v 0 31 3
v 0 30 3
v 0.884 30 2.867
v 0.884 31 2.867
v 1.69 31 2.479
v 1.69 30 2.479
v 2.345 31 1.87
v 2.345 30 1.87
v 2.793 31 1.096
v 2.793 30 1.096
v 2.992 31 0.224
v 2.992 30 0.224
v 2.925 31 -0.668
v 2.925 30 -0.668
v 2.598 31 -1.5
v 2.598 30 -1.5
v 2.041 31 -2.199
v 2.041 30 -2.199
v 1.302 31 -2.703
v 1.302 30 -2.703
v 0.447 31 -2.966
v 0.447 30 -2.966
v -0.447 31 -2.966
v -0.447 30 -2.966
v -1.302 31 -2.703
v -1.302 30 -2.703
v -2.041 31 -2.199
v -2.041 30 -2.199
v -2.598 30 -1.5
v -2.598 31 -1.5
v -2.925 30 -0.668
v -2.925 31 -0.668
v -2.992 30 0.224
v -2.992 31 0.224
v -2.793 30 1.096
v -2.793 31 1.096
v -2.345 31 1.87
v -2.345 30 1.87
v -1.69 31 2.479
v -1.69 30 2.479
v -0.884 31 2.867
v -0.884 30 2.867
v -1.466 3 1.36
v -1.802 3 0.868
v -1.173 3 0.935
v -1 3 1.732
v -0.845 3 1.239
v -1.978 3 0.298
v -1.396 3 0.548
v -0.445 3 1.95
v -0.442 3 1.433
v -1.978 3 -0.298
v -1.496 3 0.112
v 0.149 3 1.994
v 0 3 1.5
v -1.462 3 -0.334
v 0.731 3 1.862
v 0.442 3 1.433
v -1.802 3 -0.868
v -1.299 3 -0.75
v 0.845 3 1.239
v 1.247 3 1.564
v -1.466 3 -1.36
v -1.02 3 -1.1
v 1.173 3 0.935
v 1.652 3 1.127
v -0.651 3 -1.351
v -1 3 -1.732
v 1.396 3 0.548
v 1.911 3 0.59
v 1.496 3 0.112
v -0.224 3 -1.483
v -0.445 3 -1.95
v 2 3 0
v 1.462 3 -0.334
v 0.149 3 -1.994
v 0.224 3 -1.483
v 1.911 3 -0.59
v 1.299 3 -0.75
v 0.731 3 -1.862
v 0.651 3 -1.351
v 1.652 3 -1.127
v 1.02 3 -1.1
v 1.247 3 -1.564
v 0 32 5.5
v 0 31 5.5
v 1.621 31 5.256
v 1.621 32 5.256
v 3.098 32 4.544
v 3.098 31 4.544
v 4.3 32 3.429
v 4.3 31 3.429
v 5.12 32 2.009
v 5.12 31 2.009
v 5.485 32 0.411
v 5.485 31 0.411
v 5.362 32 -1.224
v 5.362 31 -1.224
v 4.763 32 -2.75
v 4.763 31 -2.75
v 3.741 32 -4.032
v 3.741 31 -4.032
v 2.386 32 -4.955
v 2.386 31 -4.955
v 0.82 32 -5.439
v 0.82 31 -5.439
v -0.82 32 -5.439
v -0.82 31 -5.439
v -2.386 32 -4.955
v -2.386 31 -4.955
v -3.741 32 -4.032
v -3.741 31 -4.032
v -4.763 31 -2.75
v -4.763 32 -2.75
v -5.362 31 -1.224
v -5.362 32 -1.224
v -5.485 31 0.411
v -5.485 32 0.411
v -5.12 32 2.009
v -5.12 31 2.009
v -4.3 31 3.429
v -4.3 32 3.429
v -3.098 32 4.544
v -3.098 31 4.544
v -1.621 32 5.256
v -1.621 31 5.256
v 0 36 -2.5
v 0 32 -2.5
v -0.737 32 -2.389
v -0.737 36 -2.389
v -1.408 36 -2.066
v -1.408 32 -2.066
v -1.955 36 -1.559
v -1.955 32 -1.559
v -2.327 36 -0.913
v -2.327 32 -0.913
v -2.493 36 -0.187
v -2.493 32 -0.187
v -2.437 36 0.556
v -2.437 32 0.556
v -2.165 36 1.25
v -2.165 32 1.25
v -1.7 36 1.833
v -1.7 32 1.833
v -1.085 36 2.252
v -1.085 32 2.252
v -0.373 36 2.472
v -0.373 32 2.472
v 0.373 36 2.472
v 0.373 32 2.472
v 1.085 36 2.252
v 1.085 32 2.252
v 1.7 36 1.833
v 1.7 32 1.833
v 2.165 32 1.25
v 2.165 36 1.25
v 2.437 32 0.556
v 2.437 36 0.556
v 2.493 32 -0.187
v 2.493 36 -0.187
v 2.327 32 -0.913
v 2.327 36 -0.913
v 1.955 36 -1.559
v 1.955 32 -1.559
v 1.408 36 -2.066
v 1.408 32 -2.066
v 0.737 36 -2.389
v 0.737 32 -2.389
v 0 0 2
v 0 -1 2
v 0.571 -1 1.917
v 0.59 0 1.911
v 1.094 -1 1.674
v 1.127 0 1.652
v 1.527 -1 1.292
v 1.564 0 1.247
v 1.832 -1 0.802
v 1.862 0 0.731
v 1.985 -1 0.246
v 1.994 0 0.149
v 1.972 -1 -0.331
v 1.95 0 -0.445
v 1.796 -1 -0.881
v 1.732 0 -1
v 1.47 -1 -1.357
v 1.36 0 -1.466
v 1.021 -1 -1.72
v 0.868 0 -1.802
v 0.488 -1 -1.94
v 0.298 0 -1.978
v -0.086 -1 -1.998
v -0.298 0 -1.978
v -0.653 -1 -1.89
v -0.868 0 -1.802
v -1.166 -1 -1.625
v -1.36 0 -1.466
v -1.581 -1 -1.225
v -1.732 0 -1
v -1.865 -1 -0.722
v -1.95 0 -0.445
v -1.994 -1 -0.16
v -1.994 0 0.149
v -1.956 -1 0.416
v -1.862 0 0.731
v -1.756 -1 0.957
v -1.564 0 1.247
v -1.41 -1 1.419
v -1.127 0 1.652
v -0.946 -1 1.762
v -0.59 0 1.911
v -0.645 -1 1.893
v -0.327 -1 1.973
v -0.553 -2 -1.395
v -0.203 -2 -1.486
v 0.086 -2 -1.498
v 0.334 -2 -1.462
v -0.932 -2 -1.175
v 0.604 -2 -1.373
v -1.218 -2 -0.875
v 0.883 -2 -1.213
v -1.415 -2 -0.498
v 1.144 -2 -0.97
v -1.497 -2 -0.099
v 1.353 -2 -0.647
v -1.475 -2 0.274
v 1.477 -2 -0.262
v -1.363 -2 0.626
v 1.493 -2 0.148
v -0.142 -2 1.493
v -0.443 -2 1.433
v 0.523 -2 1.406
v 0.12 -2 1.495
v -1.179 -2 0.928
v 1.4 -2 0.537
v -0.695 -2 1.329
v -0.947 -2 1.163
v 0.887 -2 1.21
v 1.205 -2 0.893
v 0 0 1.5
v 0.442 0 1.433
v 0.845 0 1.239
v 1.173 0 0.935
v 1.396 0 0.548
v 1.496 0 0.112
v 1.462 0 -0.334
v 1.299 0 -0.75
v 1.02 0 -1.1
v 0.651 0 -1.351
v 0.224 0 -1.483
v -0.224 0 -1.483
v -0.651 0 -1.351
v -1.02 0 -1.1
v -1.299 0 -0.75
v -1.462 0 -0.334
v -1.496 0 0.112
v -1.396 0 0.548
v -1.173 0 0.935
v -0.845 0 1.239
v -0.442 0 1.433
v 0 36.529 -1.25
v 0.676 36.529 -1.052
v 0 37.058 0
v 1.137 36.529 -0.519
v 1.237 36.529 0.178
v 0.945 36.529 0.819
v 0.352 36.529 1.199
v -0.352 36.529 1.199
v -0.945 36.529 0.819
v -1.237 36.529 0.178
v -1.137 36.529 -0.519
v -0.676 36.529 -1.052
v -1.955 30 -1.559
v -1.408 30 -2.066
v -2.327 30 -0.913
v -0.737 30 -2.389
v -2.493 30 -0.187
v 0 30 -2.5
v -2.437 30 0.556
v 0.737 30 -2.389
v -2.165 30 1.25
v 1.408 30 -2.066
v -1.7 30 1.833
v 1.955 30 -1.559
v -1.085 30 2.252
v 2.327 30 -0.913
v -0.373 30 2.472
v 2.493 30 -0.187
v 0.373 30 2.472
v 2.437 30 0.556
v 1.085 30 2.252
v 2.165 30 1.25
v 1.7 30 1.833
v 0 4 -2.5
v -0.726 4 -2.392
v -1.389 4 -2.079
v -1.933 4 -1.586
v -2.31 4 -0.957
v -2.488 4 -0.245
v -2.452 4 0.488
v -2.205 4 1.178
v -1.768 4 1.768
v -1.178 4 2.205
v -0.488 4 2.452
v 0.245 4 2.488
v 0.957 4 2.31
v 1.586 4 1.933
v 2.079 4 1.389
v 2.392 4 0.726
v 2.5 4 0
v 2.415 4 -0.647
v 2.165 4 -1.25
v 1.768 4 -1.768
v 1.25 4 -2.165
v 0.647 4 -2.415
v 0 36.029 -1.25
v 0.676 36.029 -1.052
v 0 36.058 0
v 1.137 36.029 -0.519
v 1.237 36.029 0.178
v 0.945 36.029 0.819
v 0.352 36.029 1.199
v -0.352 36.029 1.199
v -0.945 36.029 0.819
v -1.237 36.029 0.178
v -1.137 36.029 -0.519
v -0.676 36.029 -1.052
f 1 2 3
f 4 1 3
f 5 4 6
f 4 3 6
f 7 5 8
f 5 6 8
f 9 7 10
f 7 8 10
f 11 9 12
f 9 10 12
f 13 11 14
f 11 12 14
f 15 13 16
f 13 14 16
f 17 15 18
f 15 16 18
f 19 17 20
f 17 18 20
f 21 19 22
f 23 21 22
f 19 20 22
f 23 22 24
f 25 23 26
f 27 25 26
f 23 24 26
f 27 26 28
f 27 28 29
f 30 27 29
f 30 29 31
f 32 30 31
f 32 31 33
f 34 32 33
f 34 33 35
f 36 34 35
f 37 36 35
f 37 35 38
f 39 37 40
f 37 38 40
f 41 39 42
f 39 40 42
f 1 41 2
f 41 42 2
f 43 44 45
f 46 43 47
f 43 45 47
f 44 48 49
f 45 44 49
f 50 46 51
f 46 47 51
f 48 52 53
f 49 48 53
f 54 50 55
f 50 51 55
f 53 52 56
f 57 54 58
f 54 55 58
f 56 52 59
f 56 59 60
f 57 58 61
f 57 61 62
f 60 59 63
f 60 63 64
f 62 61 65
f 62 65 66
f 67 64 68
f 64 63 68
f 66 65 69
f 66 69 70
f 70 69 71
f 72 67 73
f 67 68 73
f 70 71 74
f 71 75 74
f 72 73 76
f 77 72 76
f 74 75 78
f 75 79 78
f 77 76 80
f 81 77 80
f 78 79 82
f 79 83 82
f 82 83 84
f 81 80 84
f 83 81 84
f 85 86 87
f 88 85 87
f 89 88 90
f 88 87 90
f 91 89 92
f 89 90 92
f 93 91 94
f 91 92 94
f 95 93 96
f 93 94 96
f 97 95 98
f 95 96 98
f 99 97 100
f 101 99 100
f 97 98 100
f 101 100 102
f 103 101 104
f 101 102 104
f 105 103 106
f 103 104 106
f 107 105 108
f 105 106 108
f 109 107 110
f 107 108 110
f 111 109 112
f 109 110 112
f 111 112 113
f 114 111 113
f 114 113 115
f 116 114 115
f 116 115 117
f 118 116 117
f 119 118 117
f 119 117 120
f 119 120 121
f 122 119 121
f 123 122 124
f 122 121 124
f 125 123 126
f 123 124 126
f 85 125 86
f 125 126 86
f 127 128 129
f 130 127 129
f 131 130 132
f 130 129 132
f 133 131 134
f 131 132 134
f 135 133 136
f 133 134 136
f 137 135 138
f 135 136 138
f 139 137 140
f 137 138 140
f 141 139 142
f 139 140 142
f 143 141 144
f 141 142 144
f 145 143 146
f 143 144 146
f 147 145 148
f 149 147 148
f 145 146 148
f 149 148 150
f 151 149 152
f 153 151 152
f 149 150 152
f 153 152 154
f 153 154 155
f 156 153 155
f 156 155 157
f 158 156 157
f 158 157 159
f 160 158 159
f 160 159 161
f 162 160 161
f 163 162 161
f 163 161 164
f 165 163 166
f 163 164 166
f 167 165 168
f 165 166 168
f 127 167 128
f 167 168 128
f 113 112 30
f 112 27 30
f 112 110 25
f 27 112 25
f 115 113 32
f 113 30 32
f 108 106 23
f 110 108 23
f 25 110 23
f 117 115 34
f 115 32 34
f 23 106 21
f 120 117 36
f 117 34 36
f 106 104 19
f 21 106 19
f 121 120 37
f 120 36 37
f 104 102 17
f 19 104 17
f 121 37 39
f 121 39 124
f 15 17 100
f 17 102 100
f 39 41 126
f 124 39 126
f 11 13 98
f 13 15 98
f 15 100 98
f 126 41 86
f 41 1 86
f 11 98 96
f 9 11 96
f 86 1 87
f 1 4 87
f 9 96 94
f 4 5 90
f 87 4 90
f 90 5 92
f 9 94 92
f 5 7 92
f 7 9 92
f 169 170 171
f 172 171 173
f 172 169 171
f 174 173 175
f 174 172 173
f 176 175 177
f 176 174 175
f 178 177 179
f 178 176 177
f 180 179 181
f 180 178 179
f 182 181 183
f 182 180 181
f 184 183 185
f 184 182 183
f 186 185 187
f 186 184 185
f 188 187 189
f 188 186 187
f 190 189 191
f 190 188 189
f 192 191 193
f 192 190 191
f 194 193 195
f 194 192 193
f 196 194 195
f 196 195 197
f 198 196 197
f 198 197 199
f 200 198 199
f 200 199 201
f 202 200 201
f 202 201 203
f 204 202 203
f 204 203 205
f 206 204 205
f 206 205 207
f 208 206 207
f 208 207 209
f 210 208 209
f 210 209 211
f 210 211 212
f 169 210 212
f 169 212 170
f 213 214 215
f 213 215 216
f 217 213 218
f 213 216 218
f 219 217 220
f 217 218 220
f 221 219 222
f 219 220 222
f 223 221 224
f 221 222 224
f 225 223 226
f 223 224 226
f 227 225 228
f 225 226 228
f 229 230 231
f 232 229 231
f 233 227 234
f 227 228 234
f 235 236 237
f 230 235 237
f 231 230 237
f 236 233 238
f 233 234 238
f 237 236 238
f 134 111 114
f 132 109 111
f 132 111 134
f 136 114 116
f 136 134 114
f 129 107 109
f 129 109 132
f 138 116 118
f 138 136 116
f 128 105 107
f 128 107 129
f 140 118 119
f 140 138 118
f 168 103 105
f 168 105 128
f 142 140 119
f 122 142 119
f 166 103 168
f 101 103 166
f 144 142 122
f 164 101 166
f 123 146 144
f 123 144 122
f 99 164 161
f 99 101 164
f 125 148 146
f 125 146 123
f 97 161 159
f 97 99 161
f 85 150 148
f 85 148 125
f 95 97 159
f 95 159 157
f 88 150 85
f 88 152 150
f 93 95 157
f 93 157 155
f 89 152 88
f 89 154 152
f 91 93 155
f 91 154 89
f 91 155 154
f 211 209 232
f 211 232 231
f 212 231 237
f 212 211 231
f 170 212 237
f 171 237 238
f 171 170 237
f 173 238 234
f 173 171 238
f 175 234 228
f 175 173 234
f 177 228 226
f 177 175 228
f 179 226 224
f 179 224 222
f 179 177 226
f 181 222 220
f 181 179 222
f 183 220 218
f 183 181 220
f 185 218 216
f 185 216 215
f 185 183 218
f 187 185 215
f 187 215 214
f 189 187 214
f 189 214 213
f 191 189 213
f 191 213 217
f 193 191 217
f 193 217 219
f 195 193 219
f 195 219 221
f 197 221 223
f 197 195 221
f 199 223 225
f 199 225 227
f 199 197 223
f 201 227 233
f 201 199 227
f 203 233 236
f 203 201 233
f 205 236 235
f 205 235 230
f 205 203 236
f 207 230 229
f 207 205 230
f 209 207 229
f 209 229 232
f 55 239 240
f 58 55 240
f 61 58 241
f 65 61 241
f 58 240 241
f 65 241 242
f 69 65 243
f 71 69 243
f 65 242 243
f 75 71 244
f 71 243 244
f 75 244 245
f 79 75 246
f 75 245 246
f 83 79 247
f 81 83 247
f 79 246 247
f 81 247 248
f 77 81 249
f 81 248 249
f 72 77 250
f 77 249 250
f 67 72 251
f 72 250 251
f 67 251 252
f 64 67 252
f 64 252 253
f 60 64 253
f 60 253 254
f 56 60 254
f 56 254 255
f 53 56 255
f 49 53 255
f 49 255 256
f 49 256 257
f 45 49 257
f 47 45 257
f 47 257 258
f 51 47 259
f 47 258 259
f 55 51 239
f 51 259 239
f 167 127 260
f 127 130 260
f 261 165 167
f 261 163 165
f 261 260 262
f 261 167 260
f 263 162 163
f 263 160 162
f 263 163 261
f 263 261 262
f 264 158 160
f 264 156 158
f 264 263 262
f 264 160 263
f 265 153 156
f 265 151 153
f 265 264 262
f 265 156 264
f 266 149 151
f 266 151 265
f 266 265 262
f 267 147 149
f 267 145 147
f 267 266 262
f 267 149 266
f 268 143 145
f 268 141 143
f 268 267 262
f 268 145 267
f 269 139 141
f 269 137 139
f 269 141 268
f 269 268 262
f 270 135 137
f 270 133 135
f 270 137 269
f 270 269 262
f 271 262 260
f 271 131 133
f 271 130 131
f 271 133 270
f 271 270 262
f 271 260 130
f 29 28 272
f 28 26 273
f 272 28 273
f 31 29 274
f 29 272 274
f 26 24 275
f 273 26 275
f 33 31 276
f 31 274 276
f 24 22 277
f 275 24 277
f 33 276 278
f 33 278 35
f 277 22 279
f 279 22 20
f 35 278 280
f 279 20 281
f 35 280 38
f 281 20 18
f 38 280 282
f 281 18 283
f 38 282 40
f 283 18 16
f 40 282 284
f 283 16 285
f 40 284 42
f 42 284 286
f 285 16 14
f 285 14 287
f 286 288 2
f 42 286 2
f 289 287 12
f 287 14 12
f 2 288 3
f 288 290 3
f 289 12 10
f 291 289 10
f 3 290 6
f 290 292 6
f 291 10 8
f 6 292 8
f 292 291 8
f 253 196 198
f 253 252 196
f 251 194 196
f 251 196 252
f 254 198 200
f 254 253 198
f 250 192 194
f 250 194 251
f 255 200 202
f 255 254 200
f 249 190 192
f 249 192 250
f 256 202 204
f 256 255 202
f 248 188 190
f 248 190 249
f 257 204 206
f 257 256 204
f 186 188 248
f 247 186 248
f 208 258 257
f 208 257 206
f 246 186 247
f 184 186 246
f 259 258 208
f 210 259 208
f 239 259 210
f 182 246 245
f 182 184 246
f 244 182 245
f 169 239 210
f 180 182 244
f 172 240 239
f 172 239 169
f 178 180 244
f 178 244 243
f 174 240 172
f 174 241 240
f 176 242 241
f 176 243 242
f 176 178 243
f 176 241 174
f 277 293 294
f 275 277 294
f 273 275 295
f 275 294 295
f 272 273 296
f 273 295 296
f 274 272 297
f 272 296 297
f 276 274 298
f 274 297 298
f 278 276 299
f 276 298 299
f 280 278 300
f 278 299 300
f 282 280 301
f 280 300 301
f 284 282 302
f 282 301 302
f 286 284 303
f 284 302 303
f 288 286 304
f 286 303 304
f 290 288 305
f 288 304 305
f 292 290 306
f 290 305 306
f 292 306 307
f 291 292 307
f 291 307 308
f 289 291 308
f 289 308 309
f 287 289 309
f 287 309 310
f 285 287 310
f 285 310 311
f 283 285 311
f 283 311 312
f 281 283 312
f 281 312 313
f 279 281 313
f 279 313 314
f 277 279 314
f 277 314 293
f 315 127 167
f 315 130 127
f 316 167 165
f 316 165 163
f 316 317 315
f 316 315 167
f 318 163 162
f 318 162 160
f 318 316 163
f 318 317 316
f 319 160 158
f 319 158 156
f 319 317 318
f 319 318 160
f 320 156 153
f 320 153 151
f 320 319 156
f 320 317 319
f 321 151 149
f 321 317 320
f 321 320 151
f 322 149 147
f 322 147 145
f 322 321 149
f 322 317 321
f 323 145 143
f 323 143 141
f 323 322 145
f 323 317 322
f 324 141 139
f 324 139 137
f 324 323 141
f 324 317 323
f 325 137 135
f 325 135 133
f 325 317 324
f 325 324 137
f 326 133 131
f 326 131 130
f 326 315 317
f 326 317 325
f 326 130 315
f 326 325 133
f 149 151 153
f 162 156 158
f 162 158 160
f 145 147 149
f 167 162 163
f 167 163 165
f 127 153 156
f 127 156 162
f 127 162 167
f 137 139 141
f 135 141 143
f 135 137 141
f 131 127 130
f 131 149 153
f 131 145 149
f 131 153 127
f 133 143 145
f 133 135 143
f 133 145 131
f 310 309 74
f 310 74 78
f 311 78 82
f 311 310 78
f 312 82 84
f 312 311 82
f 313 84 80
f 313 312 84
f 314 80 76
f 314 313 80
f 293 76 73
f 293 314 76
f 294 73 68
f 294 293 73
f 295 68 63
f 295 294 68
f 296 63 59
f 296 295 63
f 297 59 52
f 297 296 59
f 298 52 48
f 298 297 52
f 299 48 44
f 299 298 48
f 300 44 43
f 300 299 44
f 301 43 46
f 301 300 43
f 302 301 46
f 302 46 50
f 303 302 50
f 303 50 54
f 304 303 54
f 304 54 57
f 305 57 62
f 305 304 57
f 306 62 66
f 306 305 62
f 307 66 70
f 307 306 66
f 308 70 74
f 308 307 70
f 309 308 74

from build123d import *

# Parameters (mm, degrees)
SKETCH1_R           = 2
BOSS_EXTRUDE1_DEPTH = 1
SKETCH3_R           = 1.5
BOSS_EXTRUDE2_DEPTH = 3
SKETCH4_R           = 2
SKETCH5_R           = 2.5
SKETCH5_2_R         = 2.5
BOSS_EXTRUDE4_DEPTH = 26
SKETCH9_R           = 3
BOSS_EXTRUDE5_DEPTH = 1
SKETCH10_R          = 5.5
BOSS_EXTRUDE6_DEPTH = 1
SKETCH11_R          = 2.5
BOSS_EXTRUDE7_DEPTH = 4


with BuildPart() as part:
    # Sketch1 → Boss-Extrude1 (new body)
    with BuildSketch(Plane(origin=(0, 0, 0), x_dir=(1, 0, 0), z_dir=(0, 1, 0))):
        with Locations(Location((0, 0, 0), (0, 0, 270))):
            Circle(SKETCH1_R)
    extrude(amount=-BOSS_EXTRUDE1_DEPTH)

    # Loft1: read off the stored shape, not the designer's step
    # Loft1: loft between two sections, ruled curve by curve
    loft1_from = [
        Edge.make_bspline([(0.119567695, -2, 1.495226928), (3.110021551, -2, 1.256091538), (2.870886161, -2, -1.734362318), (-0.119567695, -2, -1.495226928), (-3.110021551, -2, -1.256091538), (-2.870886161, -2, 1.734362318), (0.119567695, -2, 1.495226928)], [0, 0, 0, 0, 0.5, 0.5, 0.5, 1, 1, 1, 1], 3, [1, 0.333333333, 0.333333333, 1, 0.333333333, 0.333333333, 1]),
    ]
    loft1_to = [
        Edge.make_bspline([(-0.945839766, -1, 1.762210866), (2.578581967, -1, 3.653890398), (4.470261498, -1, 0.129468665), (0.945839766, -1, -1.762210866), (-2.578581967, -1, -3.653890398), (-4.470261498, -1, -0.129468665), (-0.945839766, -1, 1.762210866)], [0, 0, 0, 0, 0.5, 0.5, 0.5, 1, 1, 1, 1], 3, [1, 0.333333333, 0.333333333, 1, 0.333333333, 0.333333333, 1]),
    ]
    loft1 = Solid(Shell([*[Face.make_surface_from_curves(loft1_from[k], loft1_to[k]) for k in range(1)], Face(Wire(loft1_from)), Face(Wire(loft1_to))]))
    add(loft1)

    # Sketch3 → Boss-Extrude2 (add)
    with BuildSketch(Plane(origin=(0, 0, 0), x_dir=(1, 0, 0), z_dir=(0, 1, 0))):
        with Locations(Location((0, 0, 0), (0, 0, 270))):
            Circle(SKETCH3_R)
    extrude(amount=BOSS_EXTRUDE2_DEPTH)

    # Sketch4 → Loft2 section 0
    with BuildSketch(Plane(origin=(0, 3, 0), x_dir=(1, 0, 0), z_dir=(0, 1, 0))):
        Circle(SKETCH4_R)
    # Sketch5 → Loft2 section 1
    with BuildSketch(Plane(origin=(0, 4, 0), x_dir=(1, 0, 0), z_dir=(0, 1, 0))):
        Circle(SKETCH5_R)
    loft()

    # Sketch5<2> → Boss-Extrude4 (add)
    with BuildSketch(Plane(origin=(0, 4, 0), x_dir=(1, 0, 0), z_dir=(0, 1, 0))):
        with Locations(Location((0, 0, 0), (0, 0, 90))):
            Circle(SKETCH5_2_R)
    extrude(amount=BOSS_EXTRUDE4_DEPTH)

    # Sketch9 → Boss-Extrude5 (add)
    with BuildSketch(Plane(origin=(0, 30, 0), x_dir=(1, 0, 0), z_dir=(0, 1, 0))):
        with Locations(Location((0, 0, 0), (0, 0, 270))):
            Circle(SKETCH9_R)
    extrude(amount=BOSS_EXTRUDE5_DEPTH)

    # Sketch10 → Boss-Extrude6 (add)
    with BuildSketch(Plane(origin=(0, 31, 0), x_dir=(1, 0, 0), z_dir=(0, 1, 0))):
        with Locations(Location((0, 0, 0), (0, 0, 270))):
            Circle(SKETCH10_R)
    extrude(amount=BOSS_EXTRUDE6_DEPTH)

    # Sketch11 → Boss-Extrude7 (add)
    with BuildSketch(Plane(origin=(0, 32, 0), x_dir=(1, 0, 0), z_dir=(0, 1, 0))):
        with Locations(Location((0, 0, 0), (0, 0, 90))):
            Circle(SKETCH11_R)
    extrude(amount=BOSS_EXTRUDE7_DEPTH)


with BuildPart() as body_2:
    # Sketch13 → Revolve3 (revolve)
    with BuildSketch(Plane.XY, mode=Mode.PRIVATE) as revolve3_sk:
        Polygon((0, 36.057937537), (0, 37.057937537), (2.5, 36), align=None)
    revolve(revolve3_sk.sketch.rotate(Axis((0, 43.722789751, 0), (0, -1, 0)), 270), axis=Axis((0, 43.722789751, 0), (0, -1, 0)))


solid = Compound([part.part, body_2.part])
